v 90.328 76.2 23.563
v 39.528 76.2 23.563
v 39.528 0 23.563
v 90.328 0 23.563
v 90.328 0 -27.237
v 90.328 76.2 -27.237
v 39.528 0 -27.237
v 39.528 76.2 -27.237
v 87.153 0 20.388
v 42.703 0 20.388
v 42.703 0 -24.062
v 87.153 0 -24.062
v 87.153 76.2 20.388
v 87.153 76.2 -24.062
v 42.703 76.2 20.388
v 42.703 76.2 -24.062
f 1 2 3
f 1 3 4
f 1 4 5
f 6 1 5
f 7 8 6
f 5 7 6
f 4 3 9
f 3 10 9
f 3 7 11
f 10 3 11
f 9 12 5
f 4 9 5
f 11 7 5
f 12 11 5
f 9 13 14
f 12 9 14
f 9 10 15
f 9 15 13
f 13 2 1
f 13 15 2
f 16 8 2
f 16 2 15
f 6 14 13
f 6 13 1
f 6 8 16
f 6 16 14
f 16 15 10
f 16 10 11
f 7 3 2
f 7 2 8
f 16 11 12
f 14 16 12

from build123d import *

# Parameters (mm, degrees)
SKETCH1_W           = 50.8
SKETCH1_H           = 50.8
BOSS_EXTRUDE1_DEPTH = 76.2
SHELL1_T            = -3.175


with BuildPart() as part:
    # Sketch1 → Boss-Extrude1 (new body)
    with BuildSketch(Plane(origin=(0, 0, 0), x_dir=(1, 0, 0), z_dir=(0, 1, 0))):
        with Locations((64.927548208, 1.837470194)):
            Rectangle(SKETCH1_W, SKETCH1_H)
    extrude(amount=BOSS_EXTRUDE1_DEPTH)

    # Shell1
    shell1_openings = [part.faces().sort_by_distance(p)[0] for p in [
        (64.927548208, 76.2, -1.837470194),
        (64.927548208, 0, -1.837470194),
    ]]
    offset(amount=SHELL1_T, openings=shell1_openings, kind=Kind.INTERSECTION)


solid = part.part
